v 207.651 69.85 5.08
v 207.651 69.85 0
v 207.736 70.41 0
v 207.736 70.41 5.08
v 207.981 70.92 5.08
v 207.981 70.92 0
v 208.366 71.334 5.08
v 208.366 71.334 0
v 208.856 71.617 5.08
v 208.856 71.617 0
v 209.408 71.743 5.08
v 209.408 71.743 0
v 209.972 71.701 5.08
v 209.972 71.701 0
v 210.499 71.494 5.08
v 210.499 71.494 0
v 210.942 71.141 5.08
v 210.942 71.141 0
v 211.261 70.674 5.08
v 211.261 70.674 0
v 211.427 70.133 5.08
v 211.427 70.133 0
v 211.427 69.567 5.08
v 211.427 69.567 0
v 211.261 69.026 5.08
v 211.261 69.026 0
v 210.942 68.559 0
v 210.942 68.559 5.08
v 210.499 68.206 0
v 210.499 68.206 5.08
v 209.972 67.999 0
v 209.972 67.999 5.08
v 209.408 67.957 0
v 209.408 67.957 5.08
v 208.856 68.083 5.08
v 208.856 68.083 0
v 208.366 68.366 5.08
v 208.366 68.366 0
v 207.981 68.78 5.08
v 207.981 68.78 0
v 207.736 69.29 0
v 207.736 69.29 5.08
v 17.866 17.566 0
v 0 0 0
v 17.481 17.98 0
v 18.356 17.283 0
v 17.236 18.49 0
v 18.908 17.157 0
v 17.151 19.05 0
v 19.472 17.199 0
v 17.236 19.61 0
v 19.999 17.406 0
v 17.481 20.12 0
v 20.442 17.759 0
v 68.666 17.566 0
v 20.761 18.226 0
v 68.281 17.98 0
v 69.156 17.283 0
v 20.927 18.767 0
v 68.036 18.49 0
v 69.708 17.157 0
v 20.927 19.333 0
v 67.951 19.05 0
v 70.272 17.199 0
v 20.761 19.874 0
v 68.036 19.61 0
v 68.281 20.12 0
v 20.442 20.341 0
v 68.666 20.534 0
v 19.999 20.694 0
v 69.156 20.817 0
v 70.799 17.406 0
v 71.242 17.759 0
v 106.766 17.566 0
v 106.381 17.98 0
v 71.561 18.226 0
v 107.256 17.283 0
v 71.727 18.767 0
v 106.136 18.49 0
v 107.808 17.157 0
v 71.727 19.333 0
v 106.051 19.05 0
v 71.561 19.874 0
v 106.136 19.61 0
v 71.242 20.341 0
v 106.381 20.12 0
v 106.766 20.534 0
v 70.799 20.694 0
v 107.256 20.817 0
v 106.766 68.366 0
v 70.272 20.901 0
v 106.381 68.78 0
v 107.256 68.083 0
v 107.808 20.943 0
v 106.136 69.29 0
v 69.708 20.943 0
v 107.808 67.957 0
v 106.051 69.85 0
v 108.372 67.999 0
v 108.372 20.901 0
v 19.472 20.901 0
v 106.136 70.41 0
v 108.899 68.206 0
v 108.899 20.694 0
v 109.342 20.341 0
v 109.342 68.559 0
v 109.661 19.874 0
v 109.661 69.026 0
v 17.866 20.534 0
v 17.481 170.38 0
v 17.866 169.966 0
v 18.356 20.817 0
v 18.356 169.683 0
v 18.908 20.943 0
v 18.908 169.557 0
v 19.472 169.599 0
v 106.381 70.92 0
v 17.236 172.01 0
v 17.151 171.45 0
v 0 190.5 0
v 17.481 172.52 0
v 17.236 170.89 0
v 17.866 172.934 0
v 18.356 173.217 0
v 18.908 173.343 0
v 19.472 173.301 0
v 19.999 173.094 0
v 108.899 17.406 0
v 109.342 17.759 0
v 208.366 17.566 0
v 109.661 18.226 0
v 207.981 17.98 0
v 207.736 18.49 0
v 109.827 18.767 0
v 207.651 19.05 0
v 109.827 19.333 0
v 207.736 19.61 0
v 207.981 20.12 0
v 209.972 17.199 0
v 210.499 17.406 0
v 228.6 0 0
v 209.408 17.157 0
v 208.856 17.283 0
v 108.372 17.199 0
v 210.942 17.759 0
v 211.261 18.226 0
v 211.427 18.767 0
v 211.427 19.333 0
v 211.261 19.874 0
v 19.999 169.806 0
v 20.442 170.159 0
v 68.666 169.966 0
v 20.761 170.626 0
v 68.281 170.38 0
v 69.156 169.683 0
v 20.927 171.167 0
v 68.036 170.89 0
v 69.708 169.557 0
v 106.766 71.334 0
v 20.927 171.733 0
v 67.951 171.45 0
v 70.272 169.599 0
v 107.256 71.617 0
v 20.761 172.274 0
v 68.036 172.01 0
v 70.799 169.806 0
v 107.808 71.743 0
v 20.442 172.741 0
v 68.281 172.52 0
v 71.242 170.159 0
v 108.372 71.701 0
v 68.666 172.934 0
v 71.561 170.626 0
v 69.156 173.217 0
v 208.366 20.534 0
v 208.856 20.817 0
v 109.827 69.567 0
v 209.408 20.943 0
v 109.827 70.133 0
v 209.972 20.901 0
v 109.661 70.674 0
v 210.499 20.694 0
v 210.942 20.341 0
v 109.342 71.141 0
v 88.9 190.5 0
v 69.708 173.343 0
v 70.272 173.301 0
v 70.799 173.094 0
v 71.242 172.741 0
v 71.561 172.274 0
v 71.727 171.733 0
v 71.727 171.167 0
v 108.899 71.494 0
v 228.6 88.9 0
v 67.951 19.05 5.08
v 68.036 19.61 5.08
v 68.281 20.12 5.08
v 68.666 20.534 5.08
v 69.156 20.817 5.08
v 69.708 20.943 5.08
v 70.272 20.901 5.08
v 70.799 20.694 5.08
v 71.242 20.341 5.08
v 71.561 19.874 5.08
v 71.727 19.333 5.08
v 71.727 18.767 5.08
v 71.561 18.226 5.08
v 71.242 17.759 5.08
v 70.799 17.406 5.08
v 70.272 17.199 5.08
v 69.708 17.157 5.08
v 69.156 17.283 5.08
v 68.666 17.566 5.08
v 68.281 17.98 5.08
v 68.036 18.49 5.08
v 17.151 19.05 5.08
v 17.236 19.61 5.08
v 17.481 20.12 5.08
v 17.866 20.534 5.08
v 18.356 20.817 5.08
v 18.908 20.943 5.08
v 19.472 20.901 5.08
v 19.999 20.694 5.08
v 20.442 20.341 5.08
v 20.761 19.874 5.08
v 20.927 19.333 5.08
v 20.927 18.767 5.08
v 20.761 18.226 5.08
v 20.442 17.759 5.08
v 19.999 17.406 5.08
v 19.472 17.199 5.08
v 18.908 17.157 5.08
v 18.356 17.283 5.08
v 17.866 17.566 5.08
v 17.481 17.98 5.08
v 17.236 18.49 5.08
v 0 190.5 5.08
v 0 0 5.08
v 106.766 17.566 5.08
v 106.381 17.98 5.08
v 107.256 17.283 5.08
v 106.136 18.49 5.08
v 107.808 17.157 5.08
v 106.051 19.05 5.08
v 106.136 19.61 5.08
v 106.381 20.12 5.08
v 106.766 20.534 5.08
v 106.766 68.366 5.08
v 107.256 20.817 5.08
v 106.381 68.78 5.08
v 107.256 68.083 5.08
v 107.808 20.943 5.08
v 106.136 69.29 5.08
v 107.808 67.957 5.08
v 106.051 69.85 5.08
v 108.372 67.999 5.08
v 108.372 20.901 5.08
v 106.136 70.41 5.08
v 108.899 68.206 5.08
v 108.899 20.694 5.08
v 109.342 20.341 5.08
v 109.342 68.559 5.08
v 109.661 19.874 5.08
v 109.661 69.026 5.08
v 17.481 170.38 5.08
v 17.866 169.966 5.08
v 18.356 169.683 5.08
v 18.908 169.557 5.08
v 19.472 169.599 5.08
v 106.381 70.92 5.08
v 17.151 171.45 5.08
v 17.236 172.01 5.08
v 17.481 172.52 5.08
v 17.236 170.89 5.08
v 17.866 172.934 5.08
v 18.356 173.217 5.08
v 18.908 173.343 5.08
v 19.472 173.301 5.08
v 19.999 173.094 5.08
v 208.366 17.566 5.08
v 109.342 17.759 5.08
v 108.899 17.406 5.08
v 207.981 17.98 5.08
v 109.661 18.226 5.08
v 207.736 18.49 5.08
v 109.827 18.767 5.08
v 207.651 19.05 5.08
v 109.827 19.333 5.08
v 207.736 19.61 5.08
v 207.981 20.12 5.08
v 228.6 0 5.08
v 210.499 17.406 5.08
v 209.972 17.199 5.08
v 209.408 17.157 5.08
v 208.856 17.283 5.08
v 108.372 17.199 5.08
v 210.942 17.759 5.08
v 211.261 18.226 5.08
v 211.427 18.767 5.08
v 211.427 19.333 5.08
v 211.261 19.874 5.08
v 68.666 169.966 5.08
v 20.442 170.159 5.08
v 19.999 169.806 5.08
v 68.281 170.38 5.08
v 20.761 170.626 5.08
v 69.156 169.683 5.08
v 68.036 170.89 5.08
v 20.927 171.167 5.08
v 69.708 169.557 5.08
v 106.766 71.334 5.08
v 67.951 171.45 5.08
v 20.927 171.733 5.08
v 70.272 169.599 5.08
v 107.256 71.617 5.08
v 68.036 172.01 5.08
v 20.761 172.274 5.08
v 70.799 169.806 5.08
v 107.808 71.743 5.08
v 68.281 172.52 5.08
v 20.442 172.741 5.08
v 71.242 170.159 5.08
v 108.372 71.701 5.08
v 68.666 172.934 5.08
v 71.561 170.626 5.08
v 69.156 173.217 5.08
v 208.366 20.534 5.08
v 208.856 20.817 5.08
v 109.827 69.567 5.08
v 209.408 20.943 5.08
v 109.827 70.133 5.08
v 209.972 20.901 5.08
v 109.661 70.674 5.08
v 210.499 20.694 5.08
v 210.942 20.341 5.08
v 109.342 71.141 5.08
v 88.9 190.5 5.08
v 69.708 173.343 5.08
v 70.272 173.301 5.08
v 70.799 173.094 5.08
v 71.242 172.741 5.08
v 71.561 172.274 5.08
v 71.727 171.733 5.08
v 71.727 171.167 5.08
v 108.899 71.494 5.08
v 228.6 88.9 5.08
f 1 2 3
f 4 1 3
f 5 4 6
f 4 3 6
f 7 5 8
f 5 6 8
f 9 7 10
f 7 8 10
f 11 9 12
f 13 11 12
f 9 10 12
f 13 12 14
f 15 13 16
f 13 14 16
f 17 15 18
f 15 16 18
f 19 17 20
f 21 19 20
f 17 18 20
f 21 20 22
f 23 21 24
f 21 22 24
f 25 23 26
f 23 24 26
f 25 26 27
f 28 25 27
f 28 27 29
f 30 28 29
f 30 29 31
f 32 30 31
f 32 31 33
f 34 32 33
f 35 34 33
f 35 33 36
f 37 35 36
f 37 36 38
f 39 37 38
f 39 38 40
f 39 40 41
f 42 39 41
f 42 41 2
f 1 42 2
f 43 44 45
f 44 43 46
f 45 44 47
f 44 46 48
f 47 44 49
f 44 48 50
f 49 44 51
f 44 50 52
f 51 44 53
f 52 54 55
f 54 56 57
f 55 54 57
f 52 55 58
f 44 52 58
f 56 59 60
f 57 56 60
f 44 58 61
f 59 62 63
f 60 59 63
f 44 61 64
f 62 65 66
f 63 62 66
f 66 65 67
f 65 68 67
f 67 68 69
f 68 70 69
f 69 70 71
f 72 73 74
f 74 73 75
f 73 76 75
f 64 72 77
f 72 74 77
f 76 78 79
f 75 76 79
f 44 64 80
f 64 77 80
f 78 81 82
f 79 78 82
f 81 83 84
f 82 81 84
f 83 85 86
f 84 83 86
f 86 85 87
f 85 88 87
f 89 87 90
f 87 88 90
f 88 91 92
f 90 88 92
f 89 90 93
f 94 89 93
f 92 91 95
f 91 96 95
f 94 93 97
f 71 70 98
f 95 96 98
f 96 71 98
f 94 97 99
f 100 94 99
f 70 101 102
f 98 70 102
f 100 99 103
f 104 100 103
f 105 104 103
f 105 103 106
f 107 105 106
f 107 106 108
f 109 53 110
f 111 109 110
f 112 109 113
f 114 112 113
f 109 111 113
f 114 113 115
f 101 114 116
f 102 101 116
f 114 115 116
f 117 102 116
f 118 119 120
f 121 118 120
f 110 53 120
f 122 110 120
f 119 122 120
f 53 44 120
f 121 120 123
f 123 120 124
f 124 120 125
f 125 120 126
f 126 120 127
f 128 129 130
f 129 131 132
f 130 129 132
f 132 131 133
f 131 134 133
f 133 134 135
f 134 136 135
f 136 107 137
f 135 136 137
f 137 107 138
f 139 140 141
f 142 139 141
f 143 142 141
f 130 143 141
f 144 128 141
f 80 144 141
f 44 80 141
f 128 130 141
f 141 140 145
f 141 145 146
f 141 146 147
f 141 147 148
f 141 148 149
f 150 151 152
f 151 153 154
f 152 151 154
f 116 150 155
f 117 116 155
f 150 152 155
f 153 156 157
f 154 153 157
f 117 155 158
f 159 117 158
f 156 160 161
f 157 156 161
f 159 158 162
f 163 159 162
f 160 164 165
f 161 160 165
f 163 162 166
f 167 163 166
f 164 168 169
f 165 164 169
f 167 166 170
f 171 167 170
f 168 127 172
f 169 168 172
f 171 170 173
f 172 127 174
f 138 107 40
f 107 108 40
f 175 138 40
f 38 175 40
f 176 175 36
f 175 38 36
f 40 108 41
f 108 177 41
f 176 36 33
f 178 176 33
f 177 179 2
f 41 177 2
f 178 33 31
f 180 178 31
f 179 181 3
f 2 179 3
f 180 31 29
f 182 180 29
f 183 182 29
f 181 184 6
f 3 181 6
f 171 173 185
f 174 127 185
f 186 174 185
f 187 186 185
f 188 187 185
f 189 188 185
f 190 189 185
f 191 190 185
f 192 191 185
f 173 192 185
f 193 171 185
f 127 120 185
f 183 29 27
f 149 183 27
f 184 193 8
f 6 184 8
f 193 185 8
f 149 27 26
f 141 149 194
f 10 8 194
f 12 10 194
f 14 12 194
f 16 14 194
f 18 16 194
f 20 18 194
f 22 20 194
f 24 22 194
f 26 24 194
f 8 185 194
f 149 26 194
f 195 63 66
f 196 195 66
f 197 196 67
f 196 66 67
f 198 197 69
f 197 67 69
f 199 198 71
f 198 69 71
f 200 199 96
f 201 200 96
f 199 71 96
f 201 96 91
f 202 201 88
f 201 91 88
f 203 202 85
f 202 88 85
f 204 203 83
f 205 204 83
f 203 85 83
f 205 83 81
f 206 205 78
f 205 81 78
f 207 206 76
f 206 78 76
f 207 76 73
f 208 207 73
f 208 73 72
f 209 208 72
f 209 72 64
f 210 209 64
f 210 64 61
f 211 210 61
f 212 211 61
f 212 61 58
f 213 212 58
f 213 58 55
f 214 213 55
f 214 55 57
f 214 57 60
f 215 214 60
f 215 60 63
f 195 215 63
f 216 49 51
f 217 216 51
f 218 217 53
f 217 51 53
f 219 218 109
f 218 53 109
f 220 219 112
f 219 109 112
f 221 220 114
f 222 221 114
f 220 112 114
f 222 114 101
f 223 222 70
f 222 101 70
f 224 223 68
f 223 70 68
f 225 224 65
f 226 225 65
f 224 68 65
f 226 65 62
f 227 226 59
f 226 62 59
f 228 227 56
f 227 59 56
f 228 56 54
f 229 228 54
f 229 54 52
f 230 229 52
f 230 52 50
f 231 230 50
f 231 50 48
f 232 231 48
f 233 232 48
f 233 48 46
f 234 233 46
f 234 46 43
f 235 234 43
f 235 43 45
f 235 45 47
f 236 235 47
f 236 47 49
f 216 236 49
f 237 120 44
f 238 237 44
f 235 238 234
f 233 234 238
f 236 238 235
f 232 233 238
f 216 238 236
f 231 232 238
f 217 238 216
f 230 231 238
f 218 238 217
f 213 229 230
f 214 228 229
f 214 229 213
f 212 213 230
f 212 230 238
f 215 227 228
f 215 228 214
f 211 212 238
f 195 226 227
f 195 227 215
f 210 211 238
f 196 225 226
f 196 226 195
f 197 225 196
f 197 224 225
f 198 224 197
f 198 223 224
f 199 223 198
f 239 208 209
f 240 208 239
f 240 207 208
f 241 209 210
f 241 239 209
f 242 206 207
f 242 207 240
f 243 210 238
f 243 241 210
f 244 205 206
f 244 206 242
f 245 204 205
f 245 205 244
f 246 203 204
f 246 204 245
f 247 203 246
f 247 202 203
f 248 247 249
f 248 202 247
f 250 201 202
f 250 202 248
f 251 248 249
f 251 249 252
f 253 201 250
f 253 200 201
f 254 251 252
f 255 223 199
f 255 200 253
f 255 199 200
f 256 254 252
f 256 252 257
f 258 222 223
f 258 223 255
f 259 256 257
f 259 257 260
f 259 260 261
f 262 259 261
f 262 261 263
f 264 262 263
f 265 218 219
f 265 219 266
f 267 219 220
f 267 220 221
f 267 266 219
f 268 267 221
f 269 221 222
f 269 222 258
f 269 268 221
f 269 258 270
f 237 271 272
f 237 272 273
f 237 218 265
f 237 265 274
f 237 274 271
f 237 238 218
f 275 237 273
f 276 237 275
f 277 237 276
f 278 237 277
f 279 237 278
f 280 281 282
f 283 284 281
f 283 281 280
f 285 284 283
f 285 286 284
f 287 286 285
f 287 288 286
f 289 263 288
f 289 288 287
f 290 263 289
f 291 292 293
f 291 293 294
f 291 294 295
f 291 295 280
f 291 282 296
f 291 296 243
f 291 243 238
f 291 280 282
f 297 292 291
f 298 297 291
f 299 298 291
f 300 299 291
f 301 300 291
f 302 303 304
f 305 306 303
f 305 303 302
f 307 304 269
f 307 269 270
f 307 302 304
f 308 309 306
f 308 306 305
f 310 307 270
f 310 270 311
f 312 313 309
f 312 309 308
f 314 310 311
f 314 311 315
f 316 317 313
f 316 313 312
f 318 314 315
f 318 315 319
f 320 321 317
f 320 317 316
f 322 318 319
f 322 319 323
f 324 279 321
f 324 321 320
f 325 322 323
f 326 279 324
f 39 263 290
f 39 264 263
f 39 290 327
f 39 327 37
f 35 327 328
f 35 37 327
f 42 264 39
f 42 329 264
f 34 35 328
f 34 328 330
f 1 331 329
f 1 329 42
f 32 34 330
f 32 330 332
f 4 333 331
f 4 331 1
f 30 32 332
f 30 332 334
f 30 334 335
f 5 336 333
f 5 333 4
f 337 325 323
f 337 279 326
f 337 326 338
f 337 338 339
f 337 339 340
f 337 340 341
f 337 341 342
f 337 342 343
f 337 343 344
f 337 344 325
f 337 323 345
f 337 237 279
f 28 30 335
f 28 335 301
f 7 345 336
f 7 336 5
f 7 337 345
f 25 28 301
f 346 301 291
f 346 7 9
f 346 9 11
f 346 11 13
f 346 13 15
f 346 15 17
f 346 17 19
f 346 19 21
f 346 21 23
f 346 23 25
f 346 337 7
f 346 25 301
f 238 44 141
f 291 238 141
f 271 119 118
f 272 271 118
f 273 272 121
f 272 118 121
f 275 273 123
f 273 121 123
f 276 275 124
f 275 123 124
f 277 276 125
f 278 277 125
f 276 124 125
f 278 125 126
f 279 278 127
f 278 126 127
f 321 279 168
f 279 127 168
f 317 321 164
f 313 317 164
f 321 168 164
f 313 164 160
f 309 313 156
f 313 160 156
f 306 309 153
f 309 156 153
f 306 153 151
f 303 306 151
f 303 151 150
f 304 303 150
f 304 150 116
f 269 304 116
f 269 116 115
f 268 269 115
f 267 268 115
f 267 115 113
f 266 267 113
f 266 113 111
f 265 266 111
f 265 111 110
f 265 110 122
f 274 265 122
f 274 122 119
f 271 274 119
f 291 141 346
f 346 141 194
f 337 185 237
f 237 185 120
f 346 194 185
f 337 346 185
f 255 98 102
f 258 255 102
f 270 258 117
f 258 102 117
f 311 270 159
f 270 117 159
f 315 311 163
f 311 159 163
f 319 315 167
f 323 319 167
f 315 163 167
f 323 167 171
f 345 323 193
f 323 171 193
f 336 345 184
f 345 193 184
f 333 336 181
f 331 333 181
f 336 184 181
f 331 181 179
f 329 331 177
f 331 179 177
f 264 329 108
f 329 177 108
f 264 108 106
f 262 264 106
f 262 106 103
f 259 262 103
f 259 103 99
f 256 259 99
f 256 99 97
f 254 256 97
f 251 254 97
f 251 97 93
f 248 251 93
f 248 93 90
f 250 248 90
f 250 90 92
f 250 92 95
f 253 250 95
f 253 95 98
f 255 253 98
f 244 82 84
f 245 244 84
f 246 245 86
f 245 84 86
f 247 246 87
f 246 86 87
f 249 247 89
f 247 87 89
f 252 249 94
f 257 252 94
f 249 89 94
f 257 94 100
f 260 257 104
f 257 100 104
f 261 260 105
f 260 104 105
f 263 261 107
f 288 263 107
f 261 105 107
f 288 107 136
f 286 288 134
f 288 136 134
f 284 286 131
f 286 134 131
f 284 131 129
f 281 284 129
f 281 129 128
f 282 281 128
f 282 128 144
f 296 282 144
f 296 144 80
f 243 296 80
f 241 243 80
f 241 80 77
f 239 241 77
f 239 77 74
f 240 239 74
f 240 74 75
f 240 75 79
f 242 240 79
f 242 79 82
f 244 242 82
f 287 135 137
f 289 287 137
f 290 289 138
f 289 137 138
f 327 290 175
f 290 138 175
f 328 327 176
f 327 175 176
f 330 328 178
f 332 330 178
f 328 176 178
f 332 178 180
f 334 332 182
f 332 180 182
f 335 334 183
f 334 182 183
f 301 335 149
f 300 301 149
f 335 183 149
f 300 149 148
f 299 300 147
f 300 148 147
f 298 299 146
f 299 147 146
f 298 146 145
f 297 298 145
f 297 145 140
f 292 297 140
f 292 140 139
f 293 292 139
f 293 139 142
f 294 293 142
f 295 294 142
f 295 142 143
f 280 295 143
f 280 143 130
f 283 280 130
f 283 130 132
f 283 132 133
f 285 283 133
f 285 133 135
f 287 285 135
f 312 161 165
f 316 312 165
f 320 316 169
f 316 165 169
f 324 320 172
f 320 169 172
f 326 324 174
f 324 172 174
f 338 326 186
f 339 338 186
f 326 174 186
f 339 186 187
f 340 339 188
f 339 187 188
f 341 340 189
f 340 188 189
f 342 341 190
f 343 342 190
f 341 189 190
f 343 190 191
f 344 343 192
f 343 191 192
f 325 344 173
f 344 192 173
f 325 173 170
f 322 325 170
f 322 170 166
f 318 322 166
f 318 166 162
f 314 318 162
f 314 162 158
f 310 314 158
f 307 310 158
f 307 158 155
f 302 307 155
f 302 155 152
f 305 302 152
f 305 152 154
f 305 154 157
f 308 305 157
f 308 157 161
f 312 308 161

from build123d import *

# Parameters (mm, degrees)
BOSS_EXTRUDE1_DEPTH   = 5.08
F_6_CLEARANCE_HOLE1_D = 3.7973


with BuildPart() as part:
    # Sketch1 → Boss-Extrude1 (new body)
    with BuildSketch(Plane.XY):
        Polygon((0, 0), (228.6, 0), (228.6, 88.9), (88.9, 190.5), (0, 190.5), align=None)
    extrude(amount=BOSS_EXTRUDE1_DEPTH)

    # #6 Clearance Hole1 (through all)
    with Locations(Plane.XY.offset(5.08)):
        with Locations((209.55, 19.05), (19.05, 171.45), (69.85, 171.45), (69.85, 19.05), (19.05, 19.05), (107.95, 19.05), (107.95, 69.85), (209.55, 69.85)):
            Hole(F_6_CLEARANCE_HOLE1_D / 2)


solid = part.part
